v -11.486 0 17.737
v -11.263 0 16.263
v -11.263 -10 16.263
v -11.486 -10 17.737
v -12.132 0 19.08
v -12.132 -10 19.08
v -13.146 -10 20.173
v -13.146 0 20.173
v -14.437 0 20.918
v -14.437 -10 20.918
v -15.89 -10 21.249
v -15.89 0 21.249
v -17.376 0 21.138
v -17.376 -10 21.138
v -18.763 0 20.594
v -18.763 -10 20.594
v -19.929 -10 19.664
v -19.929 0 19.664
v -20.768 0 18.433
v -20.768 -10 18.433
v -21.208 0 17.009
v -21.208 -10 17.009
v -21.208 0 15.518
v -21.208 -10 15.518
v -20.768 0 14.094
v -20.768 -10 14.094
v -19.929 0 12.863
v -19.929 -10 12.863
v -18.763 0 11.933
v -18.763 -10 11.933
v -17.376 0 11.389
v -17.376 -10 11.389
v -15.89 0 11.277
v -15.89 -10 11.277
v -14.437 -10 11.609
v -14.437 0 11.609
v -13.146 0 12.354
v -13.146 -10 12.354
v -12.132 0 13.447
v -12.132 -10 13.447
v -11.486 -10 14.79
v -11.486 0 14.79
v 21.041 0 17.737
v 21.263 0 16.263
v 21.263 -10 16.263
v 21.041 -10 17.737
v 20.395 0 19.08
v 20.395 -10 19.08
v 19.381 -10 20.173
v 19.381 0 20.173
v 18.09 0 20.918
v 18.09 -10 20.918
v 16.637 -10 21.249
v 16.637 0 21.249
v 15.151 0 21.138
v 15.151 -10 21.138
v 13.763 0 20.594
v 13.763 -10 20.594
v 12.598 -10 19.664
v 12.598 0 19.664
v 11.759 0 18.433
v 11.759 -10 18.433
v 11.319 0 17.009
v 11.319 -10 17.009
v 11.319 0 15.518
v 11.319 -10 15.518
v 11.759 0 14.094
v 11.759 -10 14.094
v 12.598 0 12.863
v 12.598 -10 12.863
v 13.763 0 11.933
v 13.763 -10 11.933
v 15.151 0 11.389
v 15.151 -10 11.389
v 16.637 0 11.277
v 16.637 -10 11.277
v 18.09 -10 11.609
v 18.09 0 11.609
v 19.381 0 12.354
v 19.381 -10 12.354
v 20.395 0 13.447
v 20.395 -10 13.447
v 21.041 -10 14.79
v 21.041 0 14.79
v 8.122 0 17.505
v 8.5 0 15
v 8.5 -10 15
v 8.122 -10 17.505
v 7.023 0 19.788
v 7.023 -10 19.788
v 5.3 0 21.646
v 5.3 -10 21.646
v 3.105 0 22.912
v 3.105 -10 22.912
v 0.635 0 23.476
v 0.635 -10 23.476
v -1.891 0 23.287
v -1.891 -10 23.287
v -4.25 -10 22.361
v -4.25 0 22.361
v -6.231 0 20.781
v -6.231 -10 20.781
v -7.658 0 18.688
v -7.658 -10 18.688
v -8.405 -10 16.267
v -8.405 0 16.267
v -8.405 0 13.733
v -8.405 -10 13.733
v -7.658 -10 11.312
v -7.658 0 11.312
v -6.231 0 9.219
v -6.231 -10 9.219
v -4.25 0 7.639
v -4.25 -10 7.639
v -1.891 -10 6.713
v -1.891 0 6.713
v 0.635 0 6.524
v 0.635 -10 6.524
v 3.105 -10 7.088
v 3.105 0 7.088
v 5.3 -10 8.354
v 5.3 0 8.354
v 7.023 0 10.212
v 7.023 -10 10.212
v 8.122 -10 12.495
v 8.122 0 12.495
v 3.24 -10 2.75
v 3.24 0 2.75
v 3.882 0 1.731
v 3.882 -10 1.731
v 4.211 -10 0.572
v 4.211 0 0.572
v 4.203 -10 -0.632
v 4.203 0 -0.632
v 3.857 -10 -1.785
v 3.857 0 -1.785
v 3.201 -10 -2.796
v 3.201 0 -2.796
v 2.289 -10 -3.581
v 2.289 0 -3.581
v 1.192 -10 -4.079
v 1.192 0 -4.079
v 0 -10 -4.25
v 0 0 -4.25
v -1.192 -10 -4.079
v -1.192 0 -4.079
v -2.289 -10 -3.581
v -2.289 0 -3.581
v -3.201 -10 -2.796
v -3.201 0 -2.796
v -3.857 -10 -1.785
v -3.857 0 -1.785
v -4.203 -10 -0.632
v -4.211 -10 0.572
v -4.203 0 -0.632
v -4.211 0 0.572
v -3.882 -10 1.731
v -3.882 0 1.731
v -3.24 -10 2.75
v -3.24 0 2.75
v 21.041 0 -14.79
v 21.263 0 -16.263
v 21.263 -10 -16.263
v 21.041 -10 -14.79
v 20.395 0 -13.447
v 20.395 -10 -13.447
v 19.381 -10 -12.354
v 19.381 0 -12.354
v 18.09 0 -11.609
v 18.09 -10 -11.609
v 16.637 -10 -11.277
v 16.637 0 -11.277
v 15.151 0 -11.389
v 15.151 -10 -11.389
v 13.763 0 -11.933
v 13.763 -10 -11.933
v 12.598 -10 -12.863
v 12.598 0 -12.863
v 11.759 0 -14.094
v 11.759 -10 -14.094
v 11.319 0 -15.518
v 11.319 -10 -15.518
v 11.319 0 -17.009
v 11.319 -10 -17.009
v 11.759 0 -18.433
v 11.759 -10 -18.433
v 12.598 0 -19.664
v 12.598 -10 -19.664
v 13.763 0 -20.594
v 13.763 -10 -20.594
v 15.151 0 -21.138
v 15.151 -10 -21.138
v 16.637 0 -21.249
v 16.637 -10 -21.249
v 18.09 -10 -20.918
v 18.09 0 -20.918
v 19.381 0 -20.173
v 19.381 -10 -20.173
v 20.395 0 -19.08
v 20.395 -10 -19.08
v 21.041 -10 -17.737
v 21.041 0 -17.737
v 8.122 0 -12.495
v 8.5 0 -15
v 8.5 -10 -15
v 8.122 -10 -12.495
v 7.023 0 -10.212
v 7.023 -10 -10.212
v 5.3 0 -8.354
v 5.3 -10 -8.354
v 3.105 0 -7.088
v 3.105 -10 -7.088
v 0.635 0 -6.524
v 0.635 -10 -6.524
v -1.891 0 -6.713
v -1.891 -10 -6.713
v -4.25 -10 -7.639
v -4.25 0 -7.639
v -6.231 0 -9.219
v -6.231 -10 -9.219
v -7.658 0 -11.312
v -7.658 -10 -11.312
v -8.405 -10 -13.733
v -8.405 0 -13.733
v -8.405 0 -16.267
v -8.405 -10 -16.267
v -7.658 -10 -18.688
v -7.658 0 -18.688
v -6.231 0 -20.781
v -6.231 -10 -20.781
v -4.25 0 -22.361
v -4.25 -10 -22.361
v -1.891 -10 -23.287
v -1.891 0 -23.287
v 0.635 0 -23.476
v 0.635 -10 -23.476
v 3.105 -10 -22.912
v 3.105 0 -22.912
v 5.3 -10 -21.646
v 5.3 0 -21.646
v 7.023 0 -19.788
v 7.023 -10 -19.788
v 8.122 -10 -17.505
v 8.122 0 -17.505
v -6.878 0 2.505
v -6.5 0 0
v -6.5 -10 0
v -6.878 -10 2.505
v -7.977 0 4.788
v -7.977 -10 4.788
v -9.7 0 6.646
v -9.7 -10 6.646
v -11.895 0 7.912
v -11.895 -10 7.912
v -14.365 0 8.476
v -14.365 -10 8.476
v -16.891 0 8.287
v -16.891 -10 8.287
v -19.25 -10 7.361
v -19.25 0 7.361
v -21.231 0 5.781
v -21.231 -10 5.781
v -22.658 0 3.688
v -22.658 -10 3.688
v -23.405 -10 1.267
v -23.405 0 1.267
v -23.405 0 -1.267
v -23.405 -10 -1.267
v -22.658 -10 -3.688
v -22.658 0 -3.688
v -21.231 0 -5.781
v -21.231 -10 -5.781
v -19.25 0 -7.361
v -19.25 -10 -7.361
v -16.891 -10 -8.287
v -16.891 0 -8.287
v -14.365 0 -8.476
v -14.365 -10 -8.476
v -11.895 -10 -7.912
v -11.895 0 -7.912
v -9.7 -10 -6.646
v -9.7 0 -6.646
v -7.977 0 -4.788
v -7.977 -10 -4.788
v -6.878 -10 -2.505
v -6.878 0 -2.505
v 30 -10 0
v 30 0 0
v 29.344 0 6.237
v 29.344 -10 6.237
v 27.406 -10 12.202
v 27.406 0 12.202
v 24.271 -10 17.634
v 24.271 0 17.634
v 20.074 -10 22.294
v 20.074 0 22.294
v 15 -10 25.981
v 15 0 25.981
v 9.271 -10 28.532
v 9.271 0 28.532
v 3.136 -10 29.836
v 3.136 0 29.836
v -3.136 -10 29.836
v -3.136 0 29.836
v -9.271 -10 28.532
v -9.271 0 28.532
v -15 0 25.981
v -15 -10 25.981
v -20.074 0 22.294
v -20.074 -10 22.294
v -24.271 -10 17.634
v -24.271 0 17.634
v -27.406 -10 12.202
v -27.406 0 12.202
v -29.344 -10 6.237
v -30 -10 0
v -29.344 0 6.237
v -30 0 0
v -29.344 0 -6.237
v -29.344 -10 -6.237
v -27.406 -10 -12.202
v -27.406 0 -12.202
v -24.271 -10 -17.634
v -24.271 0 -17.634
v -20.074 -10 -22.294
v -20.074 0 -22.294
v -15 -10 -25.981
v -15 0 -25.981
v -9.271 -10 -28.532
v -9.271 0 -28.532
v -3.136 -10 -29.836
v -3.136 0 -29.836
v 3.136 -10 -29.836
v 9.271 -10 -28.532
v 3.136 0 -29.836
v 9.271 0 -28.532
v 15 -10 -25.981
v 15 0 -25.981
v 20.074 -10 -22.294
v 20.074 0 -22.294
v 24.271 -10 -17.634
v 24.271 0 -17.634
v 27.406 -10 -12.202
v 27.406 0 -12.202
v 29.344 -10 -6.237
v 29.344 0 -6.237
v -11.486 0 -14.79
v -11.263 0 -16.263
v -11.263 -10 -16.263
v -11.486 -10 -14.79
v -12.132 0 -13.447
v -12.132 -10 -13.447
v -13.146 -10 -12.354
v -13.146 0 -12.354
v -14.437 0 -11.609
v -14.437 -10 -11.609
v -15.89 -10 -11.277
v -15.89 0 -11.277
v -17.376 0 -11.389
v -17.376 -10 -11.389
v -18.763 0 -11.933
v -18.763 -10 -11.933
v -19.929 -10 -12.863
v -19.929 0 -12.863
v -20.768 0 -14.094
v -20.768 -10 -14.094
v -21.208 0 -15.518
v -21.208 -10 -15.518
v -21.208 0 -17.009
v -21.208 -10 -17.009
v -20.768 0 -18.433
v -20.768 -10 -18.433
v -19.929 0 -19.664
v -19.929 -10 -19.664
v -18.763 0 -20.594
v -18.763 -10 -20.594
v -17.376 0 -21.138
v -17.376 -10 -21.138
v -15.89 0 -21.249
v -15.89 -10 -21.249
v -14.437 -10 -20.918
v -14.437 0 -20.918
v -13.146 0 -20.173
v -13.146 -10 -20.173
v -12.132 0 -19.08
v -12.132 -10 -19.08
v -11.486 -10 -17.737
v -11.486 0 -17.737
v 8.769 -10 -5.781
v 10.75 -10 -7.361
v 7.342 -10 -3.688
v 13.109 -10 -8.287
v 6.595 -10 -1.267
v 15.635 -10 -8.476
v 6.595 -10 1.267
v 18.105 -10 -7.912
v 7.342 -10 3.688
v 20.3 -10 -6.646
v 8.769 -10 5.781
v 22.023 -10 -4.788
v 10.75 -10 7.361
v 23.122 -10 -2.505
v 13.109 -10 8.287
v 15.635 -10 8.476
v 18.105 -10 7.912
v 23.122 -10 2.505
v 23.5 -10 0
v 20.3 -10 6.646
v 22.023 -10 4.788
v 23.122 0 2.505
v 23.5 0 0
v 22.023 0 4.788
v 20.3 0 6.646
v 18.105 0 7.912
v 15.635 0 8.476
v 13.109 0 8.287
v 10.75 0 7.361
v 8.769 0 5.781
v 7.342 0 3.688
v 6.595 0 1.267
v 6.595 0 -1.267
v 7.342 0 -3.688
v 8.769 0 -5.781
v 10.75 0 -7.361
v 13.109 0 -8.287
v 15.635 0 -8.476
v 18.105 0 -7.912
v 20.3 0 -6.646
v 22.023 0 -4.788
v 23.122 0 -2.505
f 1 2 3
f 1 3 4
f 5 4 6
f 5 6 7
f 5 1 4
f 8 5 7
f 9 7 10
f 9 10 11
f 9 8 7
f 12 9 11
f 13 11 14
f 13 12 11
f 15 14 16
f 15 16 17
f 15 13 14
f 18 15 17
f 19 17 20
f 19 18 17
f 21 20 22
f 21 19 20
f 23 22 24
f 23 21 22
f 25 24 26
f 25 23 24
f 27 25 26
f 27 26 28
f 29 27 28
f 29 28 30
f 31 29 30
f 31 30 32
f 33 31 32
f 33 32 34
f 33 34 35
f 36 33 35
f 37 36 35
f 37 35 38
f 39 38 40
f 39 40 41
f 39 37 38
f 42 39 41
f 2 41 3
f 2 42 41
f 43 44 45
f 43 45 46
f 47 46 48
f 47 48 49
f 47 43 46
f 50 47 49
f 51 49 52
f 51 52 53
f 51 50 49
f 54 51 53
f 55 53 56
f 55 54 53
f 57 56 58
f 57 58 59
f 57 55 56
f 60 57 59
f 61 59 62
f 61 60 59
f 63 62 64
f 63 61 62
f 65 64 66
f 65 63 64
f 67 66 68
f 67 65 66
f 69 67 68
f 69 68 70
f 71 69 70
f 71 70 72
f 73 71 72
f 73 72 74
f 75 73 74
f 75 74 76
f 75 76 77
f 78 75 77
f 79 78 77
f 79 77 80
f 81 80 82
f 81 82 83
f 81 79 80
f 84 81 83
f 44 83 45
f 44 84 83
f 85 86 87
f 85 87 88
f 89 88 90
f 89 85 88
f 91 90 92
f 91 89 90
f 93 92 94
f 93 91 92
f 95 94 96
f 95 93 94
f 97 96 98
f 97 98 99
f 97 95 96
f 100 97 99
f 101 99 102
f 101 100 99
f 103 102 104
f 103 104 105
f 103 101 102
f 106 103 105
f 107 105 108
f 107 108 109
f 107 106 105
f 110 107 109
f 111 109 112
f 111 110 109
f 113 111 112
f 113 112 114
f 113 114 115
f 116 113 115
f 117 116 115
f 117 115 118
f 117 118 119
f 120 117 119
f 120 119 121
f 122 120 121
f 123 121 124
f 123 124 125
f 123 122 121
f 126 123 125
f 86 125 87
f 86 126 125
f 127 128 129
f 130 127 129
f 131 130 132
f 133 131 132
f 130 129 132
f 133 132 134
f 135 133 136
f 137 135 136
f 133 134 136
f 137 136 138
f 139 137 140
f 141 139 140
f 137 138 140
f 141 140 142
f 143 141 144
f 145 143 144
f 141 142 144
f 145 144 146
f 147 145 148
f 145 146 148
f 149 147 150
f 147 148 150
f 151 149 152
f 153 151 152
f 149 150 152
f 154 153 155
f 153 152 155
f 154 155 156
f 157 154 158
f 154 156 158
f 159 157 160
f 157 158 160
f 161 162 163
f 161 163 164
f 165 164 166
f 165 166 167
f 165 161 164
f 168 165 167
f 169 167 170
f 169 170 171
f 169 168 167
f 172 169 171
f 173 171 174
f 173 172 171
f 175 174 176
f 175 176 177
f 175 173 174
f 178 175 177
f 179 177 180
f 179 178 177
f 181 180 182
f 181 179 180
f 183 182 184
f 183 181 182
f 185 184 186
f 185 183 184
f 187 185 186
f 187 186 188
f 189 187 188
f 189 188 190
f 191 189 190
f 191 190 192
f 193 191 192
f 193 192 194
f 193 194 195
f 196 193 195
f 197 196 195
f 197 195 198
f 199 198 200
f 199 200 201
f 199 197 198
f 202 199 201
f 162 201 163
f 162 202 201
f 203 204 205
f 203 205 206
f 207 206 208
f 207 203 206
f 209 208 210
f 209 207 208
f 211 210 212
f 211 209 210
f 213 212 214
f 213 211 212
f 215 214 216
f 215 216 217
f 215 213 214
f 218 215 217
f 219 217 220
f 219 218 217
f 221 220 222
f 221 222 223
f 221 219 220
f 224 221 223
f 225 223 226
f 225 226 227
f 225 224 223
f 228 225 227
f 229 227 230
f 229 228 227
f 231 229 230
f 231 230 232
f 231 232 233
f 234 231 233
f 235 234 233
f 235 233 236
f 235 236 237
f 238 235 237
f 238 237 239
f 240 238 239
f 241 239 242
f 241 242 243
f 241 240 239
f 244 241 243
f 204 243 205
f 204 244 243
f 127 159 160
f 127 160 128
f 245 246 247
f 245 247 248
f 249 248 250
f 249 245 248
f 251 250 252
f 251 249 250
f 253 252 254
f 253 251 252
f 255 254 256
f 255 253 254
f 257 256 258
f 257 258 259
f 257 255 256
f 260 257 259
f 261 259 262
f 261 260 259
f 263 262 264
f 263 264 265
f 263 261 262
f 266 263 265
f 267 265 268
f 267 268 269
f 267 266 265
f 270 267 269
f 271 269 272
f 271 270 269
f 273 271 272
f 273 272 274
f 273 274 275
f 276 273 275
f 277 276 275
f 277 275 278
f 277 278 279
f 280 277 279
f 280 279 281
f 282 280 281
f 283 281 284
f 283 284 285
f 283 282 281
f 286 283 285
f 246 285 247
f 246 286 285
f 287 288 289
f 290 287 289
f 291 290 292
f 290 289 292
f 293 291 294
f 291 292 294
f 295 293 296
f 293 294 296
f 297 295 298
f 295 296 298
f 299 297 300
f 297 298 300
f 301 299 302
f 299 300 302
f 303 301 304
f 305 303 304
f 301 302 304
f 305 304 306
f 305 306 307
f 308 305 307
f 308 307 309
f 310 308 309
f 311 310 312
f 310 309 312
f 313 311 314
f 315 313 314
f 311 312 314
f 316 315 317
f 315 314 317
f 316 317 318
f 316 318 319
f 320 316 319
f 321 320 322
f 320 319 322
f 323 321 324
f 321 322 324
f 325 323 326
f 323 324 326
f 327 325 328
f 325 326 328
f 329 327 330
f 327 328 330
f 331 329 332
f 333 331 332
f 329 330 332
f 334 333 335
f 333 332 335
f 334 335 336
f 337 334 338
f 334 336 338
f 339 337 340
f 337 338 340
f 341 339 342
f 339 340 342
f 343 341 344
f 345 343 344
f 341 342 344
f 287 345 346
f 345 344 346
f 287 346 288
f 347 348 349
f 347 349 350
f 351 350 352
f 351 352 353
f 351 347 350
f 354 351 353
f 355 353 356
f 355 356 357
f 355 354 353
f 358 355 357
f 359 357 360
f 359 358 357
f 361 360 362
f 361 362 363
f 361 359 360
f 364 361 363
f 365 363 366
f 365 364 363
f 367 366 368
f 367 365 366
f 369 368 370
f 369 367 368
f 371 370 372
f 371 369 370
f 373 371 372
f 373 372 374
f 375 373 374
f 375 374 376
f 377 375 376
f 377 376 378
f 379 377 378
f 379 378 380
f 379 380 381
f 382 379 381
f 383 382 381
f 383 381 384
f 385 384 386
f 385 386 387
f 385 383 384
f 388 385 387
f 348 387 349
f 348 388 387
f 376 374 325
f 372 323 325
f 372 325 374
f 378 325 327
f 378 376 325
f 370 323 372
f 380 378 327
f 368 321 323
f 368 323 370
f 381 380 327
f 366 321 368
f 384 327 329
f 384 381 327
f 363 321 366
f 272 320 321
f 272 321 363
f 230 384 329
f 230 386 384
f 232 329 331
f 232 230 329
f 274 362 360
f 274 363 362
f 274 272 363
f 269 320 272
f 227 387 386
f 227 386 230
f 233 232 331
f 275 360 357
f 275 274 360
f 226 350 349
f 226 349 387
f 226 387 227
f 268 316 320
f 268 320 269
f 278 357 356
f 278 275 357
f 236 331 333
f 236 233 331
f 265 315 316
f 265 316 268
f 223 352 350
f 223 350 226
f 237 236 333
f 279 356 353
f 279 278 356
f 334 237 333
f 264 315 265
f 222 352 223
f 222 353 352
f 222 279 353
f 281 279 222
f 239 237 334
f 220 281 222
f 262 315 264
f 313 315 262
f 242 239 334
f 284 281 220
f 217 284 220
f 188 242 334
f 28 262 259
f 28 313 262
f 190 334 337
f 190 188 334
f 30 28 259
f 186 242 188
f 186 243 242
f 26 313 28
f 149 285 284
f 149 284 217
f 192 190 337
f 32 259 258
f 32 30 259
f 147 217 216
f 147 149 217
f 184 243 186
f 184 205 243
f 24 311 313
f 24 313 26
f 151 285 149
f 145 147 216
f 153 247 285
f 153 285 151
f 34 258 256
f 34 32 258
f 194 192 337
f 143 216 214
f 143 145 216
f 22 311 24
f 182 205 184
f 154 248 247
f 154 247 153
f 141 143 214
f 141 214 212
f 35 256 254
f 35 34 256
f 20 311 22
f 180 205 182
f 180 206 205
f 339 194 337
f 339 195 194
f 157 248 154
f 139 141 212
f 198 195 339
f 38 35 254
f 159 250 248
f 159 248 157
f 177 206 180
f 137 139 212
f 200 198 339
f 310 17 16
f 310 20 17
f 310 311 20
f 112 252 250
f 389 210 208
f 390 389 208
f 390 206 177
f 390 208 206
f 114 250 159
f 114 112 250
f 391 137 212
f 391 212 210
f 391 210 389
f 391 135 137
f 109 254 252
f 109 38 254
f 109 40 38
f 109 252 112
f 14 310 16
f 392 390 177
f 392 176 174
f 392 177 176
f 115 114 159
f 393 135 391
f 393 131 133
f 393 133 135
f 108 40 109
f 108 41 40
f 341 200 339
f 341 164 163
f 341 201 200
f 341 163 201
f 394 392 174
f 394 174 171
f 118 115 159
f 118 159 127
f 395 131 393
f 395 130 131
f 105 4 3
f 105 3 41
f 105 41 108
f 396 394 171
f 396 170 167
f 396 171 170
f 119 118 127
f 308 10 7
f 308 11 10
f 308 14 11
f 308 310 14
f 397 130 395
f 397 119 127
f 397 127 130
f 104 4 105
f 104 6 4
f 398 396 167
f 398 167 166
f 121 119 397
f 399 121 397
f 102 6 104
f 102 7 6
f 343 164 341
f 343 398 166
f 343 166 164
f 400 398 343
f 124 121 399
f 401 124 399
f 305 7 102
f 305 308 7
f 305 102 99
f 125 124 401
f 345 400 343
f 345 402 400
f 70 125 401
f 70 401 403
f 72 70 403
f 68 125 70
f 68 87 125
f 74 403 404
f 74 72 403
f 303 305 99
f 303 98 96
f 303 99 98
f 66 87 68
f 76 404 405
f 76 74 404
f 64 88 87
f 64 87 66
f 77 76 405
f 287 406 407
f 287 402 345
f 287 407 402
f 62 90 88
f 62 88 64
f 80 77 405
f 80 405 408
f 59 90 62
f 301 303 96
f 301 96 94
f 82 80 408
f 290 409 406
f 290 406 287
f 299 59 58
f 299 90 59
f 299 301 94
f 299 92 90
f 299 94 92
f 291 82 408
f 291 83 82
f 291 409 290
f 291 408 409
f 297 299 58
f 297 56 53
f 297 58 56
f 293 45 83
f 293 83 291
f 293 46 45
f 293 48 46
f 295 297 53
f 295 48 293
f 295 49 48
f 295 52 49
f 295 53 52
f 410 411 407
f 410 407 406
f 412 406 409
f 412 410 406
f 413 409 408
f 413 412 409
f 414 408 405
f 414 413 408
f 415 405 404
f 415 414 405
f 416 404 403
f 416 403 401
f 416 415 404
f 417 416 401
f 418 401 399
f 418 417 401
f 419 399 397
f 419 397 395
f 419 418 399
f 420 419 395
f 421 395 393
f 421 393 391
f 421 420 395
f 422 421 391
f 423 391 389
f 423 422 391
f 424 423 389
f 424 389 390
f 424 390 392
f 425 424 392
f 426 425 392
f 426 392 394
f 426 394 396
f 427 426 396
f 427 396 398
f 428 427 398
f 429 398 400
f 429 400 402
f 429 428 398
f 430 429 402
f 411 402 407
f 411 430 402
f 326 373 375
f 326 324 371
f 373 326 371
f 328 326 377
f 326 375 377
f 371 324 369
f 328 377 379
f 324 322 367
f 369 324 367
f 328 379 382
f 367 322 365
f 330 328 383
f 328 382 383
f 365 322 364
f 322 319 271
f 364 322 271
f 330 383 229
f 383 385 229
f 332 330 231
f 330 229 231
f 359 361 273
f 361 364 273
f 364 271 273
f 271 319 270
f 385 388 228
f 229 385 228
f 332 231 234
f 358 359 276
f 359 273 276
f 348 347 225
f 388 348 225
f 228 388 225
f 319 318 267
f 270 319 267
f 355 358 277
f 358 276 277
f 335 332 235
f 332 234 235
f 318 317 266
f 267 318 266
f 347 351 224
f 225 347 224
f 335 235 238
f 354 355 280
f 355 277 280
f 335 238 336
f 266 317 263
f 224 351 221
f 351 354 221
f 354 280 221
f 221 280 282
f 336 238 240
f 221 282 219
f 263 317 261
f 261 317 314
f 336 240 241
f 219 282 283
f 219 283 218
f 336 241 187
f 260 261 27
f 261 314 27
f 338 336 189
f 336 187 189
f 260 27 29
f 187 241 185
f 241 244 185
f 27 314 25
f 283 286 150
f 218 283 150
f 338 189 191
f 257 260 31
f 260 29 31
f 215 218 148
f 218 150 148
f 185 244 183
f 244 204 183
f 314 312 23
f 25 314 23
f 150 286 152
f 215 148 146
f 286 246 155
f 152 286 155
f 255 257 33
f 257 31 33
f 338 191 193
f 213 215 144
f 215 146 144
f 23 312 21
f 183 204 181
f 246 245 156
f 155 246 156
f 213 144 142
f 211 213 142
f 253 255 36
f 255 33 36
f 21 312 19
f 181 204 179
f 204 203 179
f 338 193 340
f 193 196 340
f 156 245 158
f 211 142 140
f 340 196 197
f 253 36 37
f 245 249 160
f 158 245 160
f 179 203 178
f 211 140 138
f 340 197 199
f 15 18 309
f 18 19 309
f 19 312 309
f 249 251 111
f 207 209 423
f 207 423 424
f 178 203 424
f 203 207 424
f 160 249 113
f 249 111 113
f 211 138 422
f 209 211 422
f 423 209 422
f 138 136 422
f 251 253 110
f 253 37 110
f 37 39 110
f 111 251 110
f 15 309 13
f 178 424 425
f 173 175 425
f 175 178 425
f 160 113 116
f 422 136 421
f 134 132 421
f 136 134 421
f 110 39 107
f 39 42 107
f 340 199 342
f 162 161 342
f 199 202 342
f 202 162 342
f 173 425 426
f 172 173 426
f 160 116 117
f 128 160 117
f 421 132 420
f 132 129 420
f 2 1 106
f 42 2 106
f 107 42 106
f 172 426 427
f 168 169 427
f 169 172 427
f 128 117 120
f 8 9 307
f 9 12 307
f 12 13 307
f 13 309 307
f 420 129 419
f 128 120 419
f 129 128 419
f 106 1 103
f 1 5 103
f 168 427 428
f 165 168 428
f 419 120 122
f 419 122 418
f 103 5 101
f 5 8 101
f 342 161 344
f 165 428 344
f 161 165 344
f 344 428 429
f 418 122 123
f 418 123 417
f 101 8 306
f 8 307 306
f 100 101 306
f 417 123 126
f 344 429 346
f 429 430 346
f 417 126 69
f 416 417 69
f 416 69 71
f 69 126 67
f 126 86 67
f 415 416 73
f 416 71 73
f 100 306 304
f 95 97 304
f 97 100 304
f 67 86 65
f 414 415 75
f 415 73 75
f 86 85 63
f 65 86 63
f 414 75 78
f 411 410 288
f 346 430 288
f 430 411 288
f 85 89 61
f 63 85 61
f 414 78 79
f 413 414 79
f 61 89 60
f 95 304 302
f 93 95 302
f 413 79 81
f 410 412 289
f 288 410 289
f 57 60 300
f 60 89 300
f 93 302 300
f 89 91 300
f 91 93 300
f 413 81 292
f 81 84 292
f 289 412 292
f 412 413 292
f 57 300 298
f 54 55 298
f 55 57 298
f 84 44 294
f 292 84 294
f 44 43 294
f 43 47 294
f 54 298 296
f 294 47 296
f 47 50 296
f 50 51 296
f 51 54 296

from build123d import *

# Parameters (mm, degrees)
F0_R     = 30
F0_R_2   = 5
F0_R_3   = 8.5
F1_DEPTH = 10


with BuildPart() as f1:
    # F0 (on Front) → F1 (new body)
    with BuildSketch(Plane.XZ):
        Circle(F0_R)
        with Locations((-16.263456, -16.263456)):
            Circle(F0_R_2, mode=Mode.SUBTRACT)
        with Locations((16.263456, -16.263456)):
            Circle(F0_R_2, mode=Mode.SUBTRACT)
        with Locations((0, -15)):
            Circle(F0_R_3, mode=Mode.SUBTRACT)
        with BuildLine():
            ThreePointArc((3.24037, 2.75), (0, -4.25), (-3.24037, 2.75))
            Line((-3.24037, 2.75), (3.24037, 2.75))
        make_face(mode=Mode.SUBTRACT)
        with Locations((-15, 0)):
            Circle(F0_R_3, mode=Mode.SUBTRACT)
        with Locations((-16.263456, 16.263456)):
            Circle(F0_R_2, mode=Mode.SUBTRACT)
        with Locations((15, 0)):
            Circle(F0_R_3, mode=Mode.SUBTRACT)
        with Locations((0, 15)):
            Circle(F0_R_3, mode=Mode.SUBTRACT)
        with Locations((16.263456, 16.263456)):
            Circle(F0_R_2, mode=Mode.SUBTRACT)
    extrude(amount=F1_DEPTH)


solid = f1.part
